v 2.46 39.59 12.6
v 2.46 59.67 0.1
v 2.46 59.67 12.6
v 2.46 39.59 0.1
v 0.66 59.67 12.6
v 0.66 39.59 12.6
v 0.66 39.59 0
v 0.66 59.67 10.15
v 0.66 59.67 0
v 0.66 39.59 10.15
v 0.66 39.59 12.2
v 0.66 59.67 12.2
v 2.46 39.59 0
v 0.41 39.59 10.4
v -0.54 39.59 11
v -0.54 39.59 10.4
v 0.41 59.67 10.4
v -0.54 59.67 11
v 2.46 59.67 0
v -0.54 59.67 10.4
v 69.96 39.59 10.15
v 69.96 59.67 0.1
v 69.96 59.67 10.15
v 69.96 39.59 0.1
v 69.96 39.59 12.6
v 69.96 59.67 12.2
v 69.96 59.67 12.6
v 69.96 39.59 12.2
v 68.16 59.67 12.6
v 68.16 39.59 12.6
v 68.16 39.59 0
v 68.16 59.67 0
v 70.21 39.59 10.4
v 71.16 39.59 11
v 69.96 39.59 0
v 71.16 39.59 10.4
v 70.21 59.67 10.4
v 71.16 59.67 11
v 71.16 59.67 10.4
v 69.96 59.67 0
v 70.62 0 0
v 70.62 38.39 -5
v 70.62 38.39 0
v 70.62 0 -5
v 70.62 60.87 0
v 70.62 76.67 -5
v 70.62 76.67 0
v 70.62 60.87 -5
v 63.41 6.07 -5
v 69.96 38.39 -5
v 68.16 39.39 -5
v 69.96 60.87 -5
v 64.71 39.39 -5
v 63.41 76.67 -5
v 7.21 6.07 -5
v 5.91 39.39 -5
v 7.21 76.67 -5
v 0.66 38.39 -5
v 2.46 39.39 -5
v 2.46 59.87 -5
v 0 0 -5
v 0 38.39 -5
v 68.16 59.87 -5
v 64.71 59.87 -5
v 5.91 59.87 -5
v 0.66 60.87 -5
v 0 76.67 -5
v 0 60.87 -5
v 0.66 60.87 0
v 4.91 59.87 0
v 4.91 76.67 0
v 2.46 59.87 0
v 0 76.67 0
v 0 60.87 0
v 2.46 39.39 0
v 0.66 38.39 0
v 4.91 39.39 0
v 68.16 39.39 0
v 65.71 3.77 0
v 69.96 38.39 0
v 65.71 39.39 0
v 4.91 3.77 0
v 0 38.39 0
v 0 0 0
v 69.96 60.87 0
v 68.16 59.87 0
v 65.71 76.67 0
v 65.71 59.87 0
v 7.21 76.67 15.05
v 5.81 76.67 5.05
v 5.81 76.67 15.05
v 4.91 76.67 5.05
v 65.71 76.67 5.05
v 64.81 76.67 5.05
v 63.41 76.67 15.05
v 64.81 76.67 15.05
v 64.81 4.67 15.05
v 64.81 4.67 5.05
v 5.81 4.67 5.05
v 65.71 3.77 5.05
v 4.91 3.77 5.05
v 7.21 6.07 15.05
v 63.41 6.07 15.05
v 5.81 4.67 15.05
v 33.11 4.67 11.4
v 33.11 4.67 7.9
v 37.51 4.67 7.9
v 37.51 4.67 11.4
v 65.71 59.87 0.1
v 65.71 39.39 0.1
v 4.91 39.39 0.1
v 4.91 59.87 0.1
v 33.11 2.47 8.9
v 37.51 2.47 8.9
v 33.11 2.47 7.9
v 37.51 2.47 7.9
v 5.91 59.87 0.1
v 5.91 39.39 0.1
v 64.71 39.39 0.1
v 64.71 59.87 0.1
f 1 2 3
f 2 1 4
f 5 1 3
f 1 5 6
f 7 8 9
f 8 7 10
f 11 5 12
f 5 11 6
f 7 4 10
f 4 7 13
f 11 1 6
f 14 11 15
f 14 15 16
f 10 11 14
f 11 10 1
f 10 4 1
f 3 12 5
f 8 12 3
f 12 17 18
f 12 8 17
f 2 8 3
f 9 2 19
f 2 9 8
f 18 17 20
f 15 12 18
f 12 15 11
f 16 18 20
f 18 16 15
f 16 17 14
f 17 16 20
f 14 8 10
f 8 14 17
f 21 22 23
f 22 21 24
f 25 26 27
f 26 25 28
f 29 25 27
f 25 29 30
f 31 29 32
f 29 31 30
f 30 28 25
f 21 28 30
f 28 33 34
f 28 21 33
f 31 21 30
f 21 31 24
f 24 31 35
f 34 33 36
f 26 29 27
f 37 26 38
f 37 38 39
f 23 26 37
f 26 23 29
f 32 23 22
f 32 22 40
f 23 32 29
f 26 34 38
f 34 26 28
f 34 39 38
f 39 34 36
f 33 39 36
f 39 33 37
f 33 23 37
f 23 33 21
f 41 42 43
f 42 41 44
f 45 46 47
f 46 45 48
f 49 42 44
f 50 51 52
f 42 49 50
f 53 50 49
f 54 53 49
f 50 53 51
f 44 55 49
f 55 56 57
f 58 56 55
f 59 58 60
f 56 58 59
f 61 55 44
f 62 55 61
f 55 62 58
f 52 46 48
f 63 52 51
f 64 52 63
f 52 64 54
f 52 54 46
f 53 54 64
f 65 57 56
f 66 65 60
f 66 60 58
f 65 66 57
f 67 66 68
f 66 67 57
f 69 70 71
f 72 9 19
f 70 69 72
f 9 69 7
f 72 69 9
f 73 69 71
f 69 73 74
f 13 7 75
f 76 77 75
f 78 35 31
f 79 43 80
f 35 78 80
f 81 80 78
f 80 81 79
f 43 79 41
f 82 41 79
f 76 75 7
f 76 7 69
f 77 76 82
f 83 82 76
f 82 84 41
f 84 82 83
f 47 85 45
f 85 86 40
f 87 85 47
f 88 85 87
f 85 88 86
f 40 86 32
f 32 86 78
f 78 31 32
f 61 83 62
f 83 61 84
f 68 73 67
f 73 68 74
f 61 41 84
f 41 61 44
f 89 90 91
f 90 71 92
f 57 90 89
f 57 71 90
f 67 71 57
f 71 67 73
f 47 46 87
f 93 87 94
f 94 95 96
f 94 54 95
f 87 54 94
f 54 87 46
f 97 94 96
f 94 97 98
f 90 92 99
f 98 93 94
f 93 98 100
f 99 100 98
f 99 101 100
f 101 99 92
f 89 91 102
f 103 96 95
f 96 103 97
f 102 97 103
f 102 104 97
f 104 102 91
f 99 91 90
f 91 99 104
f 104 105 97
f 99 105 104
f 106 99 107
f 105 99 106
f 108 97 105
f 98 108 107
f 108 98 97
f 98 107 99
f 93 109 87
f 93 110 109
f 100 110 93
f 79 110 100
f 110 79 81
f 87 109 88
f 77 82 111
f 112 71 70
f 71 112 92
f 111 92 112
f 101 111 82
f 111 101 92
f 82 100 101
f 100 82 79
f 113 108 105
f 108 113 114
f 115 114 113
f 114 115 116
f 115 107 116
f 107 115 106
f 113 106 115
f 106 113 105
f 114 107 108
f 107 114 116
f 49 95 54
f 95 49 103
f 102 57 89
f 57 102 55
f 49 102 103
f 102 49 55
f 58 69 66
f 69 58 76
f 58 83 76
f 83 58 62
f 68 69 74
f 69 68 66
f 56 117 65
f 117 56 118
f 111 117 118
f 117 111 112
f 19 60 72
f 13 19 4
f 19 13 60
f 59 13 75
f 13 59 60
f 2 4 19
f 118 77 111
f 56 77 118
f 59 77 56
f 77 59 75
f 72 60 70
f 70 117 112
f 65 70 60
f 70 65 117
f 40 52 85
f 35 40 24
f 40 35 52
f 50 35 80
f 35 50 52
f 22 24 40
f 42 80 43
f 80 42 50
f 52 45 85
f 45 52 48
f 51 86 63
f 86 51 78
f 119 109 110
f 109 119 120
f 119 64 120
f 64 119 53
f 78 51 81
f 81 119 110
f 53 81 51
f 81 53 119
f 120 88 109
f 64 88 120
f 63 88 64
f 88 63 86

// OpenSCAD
// ==============================================================================
// SMART MOUSETRAP - MINIMAL OUTLINE TEST-FIT GAUGES
// Fast, low-filament calibration prints to verify physical fits before full print
// ==============================================================================
// 1. Trap Interface Gauge: ~12 min print, ~7g filament
//    - Tests spigot fit into clear acrylic tunnel (59.0 x 72.0 mm)
//    - Tests top roof notch catch tab
//    - Tests side cantilever snap arms & loop engagement
//    - Features generous bottom cutout to clear jutting black piece & baseplate!
// 2. PCB & Sensor Test Plate: ~8 min print, ~5g filament
//    - Tests M3 diagonal standoff spacing: (4.69, 4.20) and (58.16, 61.63)
//    - Tests OV2640 camera snap pocket & lens aperture
//    - Tests TOF050C sensor M2 screw bosses & optical snout window
// 3. Top Hatch Dovetail Gauge: ~5 min print, ~3g filament
//    - Tests sliding fit of USB access hatch door in guide rails
// ==============================================================================

$fn = 40;

// Trap Tunnel Dimensions (Updated from physical test fit feedback)
height_trim      = 2.00;  // Trimmed 2.00mm total (was 1.25mm; lowered ceiling by 0.75mm per Wade's instruction)
trap_w_in        = 59.50; // Clear tunnel inner width
trap_w_out       = 62.00; // Clear tunnel outer width
trap_h_in        = 72.60 - height_trim; // 70.60mm inner tunnel height
trap_h_out       = 74.67 - height_trim; // 72.67mm outer tunnel height

// Spigot & Snap Arm Dimensions (Caliper-Verified from IMG_6354 & IMG_6363 + Fit Feedback)
spigot_w_out     = 59.00; // Outer width of spigot (0.5mm total clearance)
spigot_total_h   = 74.00 - height_trim; // 72.00mm outer height from Y=0 (lowered ceiling by 0.75mm)
spigot_len       = 15.05; // Total depth from collar shoulder to front tip (IMG_6354: 15.05mm)
spigot_sleeve_len= 10.00; // Front sleeve length that slides inside clear trap (IMG_6390: 10.0mm insertion)
step_len         = spigot_len - spigot_sleeve_len; // 5.05mm stepped section before collar
step_t           = 0.90;  // Thickness step-up (0.9mm per side and top to butt squarely against clear trap edge)
spigot_wall_t    = 1.40;  // Spigot wall thickness
collar_depth     = 5.00;  // Rear collar depth past shoulder

wall_t           = 2.00;
housing_w_out    = 70.62;
housing_h_out    = 78.67 - height_trim; // 76.67mm outer collar height (lowered ceiling by 0.75mm)
spigot_x_off     = (housing_w_out - spigot_w_out)/2; // 5.81mm
spigot_y_off     = wall_t;                           // 2.00mm
spigot_h_out     = spigot_total_h - spigot_y_off;    // 70.00mm

clip_w           = 20.08; // Arm vertical height (IMG_6346: 20.08mm)
clip_t           = 1.80;  // Arm beam thickness (sleek 1.80mm, matches original molded clip)
arm_y            = 17.00; // Moved UP 1.0mm per test fit (was 16.00mm, preserves height below)
gap              = 3.35;  // Gap between spigot and arm (moved outward 1.0mm each side per Wade's instruction)
hook_h           = 1.20;  // Outward snap hook protrusion with 90-deg mechanical retaining shelf (matches original IMG_6407)
arm_root_len     = collar_depth; // Rooted in collar
clip_z_shift     = 2.45;  // Shift clips & tab 2.45mm rearward so trap body seats flush against 10mm step (IMG_6394-6398)
arm_free_len     = spigot_len - clip_z_shift; // 12.60mm free cantilever beam length

// Top roof latch tab dimensions (IMG_6388 & IMG_6389 comparison)
tab_w            = 4.40;  // Narrowed from 7.00mm to 4.40mm to match original notch
tab_h            = 2.20;  // Increased from 1.20mm to 2.20mm to stick up properly into clear trap roof cutout
tab_ramp_l       = 2.50;  // Lead-in entry ramp
tab_flat_l       = 1.00;  // Flat crest before vertical catch drop
tab_total_l      = tab_ramp_l + tab_flat_l; // 3.50mm total tab length along Z

// Bottom Cutout for Jutting Black Box & Baseplate (IMG_6363: 22.70mm height)
bottom_cutout_w  = spigot_w_out + 2.0; // Full width clearance
bottom_cutout_h  = 24.00;              // Clears 22.70mm high jutting black box with 1.3mm margin


// ------------------------------------------------------------------------------
// PART SELECTION
// ------------------------------------------------------------------------------
PART = "trap_interface"; // Options: "trap_interface", "pcb_sensor_plate", "top_hatch_gauge", "all_gauges"

// ==============================================================================
// 1. TRAP INTERFACE TEST GAUGE
// ==============================================================================
module trap_interface_gauge() {
    difference() {
        union() {
            // A. Collar / Shoulder Stop (Z = 0 to collar_depth)
            translate([0, 0, 0])
                cube([housing_w_out, housing_h_out, collar_depth]);

            // B. Mating Spigot:
            // B1. Front thin sleeve that enters clear tunnel (Z = -spigot_len to -step_len, 10.0mm long)
            translate([spigot_x_off, 0, -spigot_len])
                cube([spigot_w_out, spigot_h_out + spigot_y_off, spigot_sleeve_len]);

            // B2. Stepped sleeve depth stop (Z = -step_len to 0, 5.05mm long)
            // Steps UP by step_t (0.90mm) on left, right, and top to butt squarely against clear trap edge!
            translate([spigot_x_off - step_t, 0, -step_len])
                cube([spigot_w_out + 2*step_t, spigot_h_out + spigot_y_off + step_t, step_len]);

            // C. Top Catch Tab (on top of spigot, engages clear trap roof notch)
            // Shifted rearward by clip_z_shift (2.45mm) to seat clear trap body flush against 10mm step
            translate([housing_w_out/2, spigot_y_off + spigot_h_out, -spigot_len + 1.2 + clip_z_shift]) {
                polyhedron(
                    points=[
                        [-tab_w/2, 0, 0], [tab_w/2, 0, 0],
                        [tab_w/2, tab_h, tab_ramp_l], [-tab_w/2, tab_h, tab_ramp_l],
                        [-tab_w/2, 0, tab_total_l], [tab_w/2, 0, tab_total_l],
                        [tab_w/2, tab_h, tab_total_l], [-tab_w/2, tab_h, tab_total_l]
                    ],
                    faces=[
                        [0, 3, 2, 1], // ramp face
                        [3, 7, 6, 2], // top flat crest
                        [4, 5, 6, 7], // vertical retaining back-face
                        [0, 1, 5, 4], // bottom base
                        [0, 4, 7, 3], // left side
                        [1, 2, 6, 5]  // right side
                    ]
                );
            }

            // D. Side Cantilever Snap Arms (Left & Right)
            // Left Arm - Shifted rearward by clip_z_shift (2.45mm) to seat clear trap body flush against 10mm step
            arm_l_x = spigot_x_off - gap - clip_t;
            translate([arm_l_x, arm_y, -spigot_len + clip_z_shift]) {
                // Continuous Cantilever Beam from front tip into collar
                cube([clip_t, clip_w, arm_free_len + arm_root_len]);
                
                // Outward Retaining Snap Hook with flat 90-degree retaining shelf & 0.25mm root transition
                // Matches original molded latch (IMG_6407 & IMG_6408) for 100% positive mechanical lock
                polyhedron(
                    points=[
                        [0, 0, 0.4],             // 0
                        [-hook_h, 0, 1.6],        // 1
                        [-hook_h, clip_w, 1.6],   // 2
                        [0, clip_w, 0.4],         // 3
                        [-hook_h, 0, 2.2],        // 4
                        [-hook_h, clip_w, 2.2],   // 5
                        [-0.25, 0, 2.2],          // 6
                        [-0.25, clip_w, 2.2],     // 7
                        [0, 0, 2.45],             // 8
                        [0, clip_w, 2.45]         // 9
                    ],
                    faces=[
                        [0, 1, 2, 3],    // front lead-in ramp (normals point -Z, -X)
                        [1, 4, 5, 2],    // crest flat (normal points -X)
                        [4, 6, 7, 5],    // 90-deg flat retaining shelf (normal points +Z)
                        [6, 8, 9, 7],    // 45-deg root transition
                        [8, 0, 3, 9],    // base attached to beam (normal points +X)
                        [0, 8, 6, 4, 1], // side Y=0 (normal points -Y)
                        [3, 2, 5, 7, 9]  // side Y=clip_w (normal points +Y)
                    ]
                );
            }

            // Right Arm - Shifted rearward by clip_z_shift (2.45mm) to seat clear trap body flush against 10mm step
            arm_r_x = spigot_x_off + spigot_w_out + gap;
            translate([arm_r_x, arm_y, -spigot_len + clip_z_shift]) {
                // Continuous Cantilever Beam from front tip into collar
                cube([clip_t, clip_w, arm_free_len + arm_root_len]);
                
                // Outward Retaining Snap Hook with flat 90-degree retaining shelf & 0.25mm root transition
                // Matches original molded latch (IMG_6407 & IMG_6408) for 100% positive mechanical lock
                polyhedron(
                    points=[
                        [clip_t, 0, 0.4],                     // 0
                        [clip_t + hook_h, 0, 1.6],            // 1
                        [clip_t + hook_h, clip_w, 1.6],       // 2
                        [clip_t, clip_w, 0.4],                 // 3
                        [clip_t + hook_h, 0, 2.2],            // 4
                        [clip_t + hook_h, clip_w, 2.2],       // 5
                        [clip_t + 0.25, 0, 2.2],              // 6
                        [clip_t + 0.25, clip_w, 2.2],         // 7
                        [clip_t, 0, 2.45],                    // 8
                        [clip_t, clip_w, 2.45]                // 9
                    ],
                    faces=[
                        [0, 3, 2, 1],    // front lead-in ramp (normals point -Z, +X)
                        [1, 2, 5, 4],    // crest flat (normal points +X)
                        [4, 5, 7, 6],    // 90-deg flat retaining shelf (normal points +Z)
                        [6, 7, 9, 8],    // 45-deg root transition
                        [8, 9, 3, 0],    // base attached to beam (normal points -X)
                        [0, 1, 4, 6, 8], // side Y=0 (normal points -Y)
                        [3, 9, 7, 5, 2]  // side Y=clip_w (normal points +Y)
                    ]
                );
            }
        }

        // --- SUBTRACTIONS ---
        // 1. Hollow Center Through Entire Gauge
        translate([spigot_x_off + spigot_wall_t, spigot_y_off + spigot_wall_t, -spigot_len - 1.0])
            cube([spigot_w_out - 2*spigot_wall_t, spigot_h_out - 2*spigot_wall_t, spigot_len + collar_depth + 2.0]);

        // 2. Cantilever Arm Flexure Relief in Collar
        rel_gap = 1.20;
        arm_l_x = spigot_x_off - gap - clip_t;
        arm_r_x = spigot_x_off + spigot_w_out + gap;
        // Left reliefs
        translate([-0.5, arm_y - rel_gap, -0.1])
            cube([arm_l_x + 0.5, clip_w + 2*rel_gap, collar_depth + 0.2]);
        translate([arm_l_x + clip_t, arm_y - 0.2, -0.1])
            cube([gap + 0.1, clip_w + 0.4, collar_depth + 0.2]);
        // Right reliefs
        translate([arm_r_x + clip_t, arm_y - rel_gap, -0.1])
            cube([housing_w_out - (arm_r_x + clip_t) + 0.5, clip_w + 2*rel_gap, collar_depth + 0.2]);
        translate([spigot_x_off + spigot_w_out - 0.1, arm_y - 0.2, -0.1])
            cube([gap + 0.1, clip_w + 0.4, collar_depth + 0.2]);

        // 4. CRITICAL: BOTTOM CLEARANCE CUTOUT FOR JUTTING BLACK BOX & BASEPLATE!
        // Cuts open the bottom between the spigot side walls from Z = -spigot_len to collar_depth,
        // preserving the lower spigot flanges that slide between the bait tray and clear trap body!
        translate([spigot_x_off + spigot_wall_t, -1.0, -spigot_len - 1.0])
            cube([spigot_w_out - 2*spigot_wall_t, bottom_cutout_h + 1.0, spigot_len + collar_depth + 2.0]);
    }
}


// ==============================================================================
// 2. PCB & SENSOR CALIBRATION TEST PLATE
// ==============================================================================
module pcb_sensor_plate() {
    plate_w = 65.42; // KiCad PCB width
    plate_h = 67.02; // KiCad PCB height
    plate_t = 2.00;  // Base plate thickness
    
    // Coordinates relative to plate origin
    h1_x = 4.69;  h1_y = 4.20;   // M3 Bottom-Left
    h2_x = 58.16; h2_y = 61.63;  // M3 Top-Right
    
    // Sensor Positions
    cam_x = 32.71; cam_y = 51.00; // Dead center X
    tof_x = 32.71; tof_y = 34.30; // Dead center X, vertically centered in tunnel
    flash_x = 15.77; flash_y = 35.91;
    
    difference() {
        union() {
            // Main Plate Base
            cube([plate_w, plate_h, plate_t]);
            
            // Standoff Bosses for PCB M3 screws (3.0mm tall)
            for (pt = [[h1_x, h1_y], [h2_x, h2_y]]) {
                translate([pt[0], pt[1], plate_t])
                    cylinder(d=6.5, h=3.0);
            }
            
            // Camera Module Retention Pocket Walls (Holds 8.5x8.5mm OV2640)
            translate([cam_x - 5.5, cam_y - 5.5, plate_t]) {
                difference() {
                    cube([11.0, 11.0, 4.0]);
                    translate([1.2, 1.2, -0.1])
                        cube([8.6, 8.6, 4.2]);
                    // Ribbon cable exit notch
                    translate([1.2 + 1.3, -0.5, 0.5])
                        cube([6.0, 2.5, 4.0]);
                }
                // Retention lip
                translate([1.2, 1.2 + 8.6 - 0.7, 3.2])
                    cube([8.6, 0.7, 0.8]);
            }
            
            // ToF Sensor M2 Screw Bosses (spaced 15.5mm)
            for (dx = [-15.5/2, 15.5/2]) {
                translate([tof_x + dx, tof_y, plate_t])
                    difference() {
                        cylinder(d=4.5, h=3.5);
                        translate([0, 0, -0.5])
                            cylinder(d=1.8, h=4.5);
                    }
            }
            // ToF Alignment Guide Ribs
            translate([tof_x - 10.2, tof_y - 5.7 - 1.0, plate_t])
                cube([20.4, 1.0, 3.0]);
            translate([tof_x - 10.2, tof_y + 5.7, plate_t])
                cube([20.4, 1.0, 3.0]);
        }
        
        // --- SUBTRACTIONS ---
        // 1. M3 Screw Holes through Standoffs
        for (pt = [[h1_x, h1_y], [h2_x, h2_y]]) {
            translate([pt[0], pt[1], -0.5])
                cylinder(d=3.2, h=plate_t + 4.0);
        }
        
        // 2. Camera Lens Aperture Hole
        translate([cam_x, cam_y, -0.5])
            cylinder(d=7.2, h=plate_t + 1.0);
            
        // 3. ToF Oval Optical Snout Aperture
        translate([tof_x, tof_y, -0.5])
            hull() {
                translate([-3.0, 0, 0]) cylinder(d=6.5, h=plate_t + 1.0);
                translate([3.0, 0, 0])  cylinder(d=6.5, h=plate_t + 1.0);
            }
            
        // 4. Flash LED Hole
        translate([flash_x, flash_y, -0.5])
            cylinder(d=8.0, h=plate_t + 1.0);
            
        // 5. Identification Embossing
        translate([plate_w/2 - 18, 5.0, plate_t - 0.6])
            linear_extrude(1.0)
                text("PCB-SENSOR GAUGE", size=3.0);
    }
}


// ==============================================================================
// 3. TOP HATCH DOVETAIL SLIDE GAUGE
// ==============================================================================
module top_hatch_gauge() {
    rail_w = 28.5;
    rail_l = 15.0;
    
    // Rail Test Block
    difference() {
        cube([rail_w + 6.0, 4.0, rail_l]);
        // Center port cutout
        translate([5.0, -0.5, -0.5])
            cube([rail_w - 4.0, 5.0, rail_l + 1.0]);
        // Left dovetail groove
        translate([3.0 + 0.8, 1.8, -0.5])
            cube([1.6, 1.4, rail_l + 1.0]);
        // Right dovetail groove
        translate([3.0 + rail_w - 2.2 - 0.2, 1.8, -0.5])
            cube([1.6, 1.4, rail_l + 1.0]);
    }
    
    // Matching Hatch Door (Positioned next to rails on build plate)
    translate([rail_w + 12.0, 0, 0]) {
        difference() {
            union() {
                cube([27.2, 1.4, 14.0]);
                // Left & right tongues
                translate([-0.9, 0.2, 0])
                    cube([0.9, 1.0, 14.0]);
                translate([27.2, 0.2, 0])
                    cube([0.9, 1.0, 14.0]);
                // Grip ridges
                for (i = [0:2]) {
                    translate([5.0 + i*6.0, 1.4, 3.0])
                        cube([2.5, 0.8, 8.0]);
                }
            }
            // ID
            translate([8.0, 0.8, 1.0])
                rotate([90, 0, 0])
                    linear_extrude(1.0)
                        text("HATCH", size=2.5);
        }
    }
}


// ==============================================================================
// RENDER & EXPORT LOGIC
// ==============================================================================
if (PART == "trap_interface") {
    // Print orientation: Collar resting flat on build plate, spigot pointing UP!
    // Requires NO SUPPORTS!
    translate([0, housing_h_out, 0])
        rotate([180, 0, 0])
            trap_interface_gauge();
}
else if (PART == "pcb_sensor_plate") {
    // Print orientation: Flat on bed
    pcb_sensor_plate();
}
else if (PART == "top_hatch_gauge") {
    // Print orientation: Flat on bed
    top_hatch_gauge();
}
else if (PART == "all_gauges") {
    // Arranged side-by-side on build plate
    translate([0, housing_h_out, 0])
        rotate([180, 0, 0])
            trap_interface_gauge();
            
    translate([housing_w_out + 10, 0, 0])
        pcb_sensor_plate();
        
    translate([housing_w_out + 10, 75, 0])
        top_hatch_gauge();
}
